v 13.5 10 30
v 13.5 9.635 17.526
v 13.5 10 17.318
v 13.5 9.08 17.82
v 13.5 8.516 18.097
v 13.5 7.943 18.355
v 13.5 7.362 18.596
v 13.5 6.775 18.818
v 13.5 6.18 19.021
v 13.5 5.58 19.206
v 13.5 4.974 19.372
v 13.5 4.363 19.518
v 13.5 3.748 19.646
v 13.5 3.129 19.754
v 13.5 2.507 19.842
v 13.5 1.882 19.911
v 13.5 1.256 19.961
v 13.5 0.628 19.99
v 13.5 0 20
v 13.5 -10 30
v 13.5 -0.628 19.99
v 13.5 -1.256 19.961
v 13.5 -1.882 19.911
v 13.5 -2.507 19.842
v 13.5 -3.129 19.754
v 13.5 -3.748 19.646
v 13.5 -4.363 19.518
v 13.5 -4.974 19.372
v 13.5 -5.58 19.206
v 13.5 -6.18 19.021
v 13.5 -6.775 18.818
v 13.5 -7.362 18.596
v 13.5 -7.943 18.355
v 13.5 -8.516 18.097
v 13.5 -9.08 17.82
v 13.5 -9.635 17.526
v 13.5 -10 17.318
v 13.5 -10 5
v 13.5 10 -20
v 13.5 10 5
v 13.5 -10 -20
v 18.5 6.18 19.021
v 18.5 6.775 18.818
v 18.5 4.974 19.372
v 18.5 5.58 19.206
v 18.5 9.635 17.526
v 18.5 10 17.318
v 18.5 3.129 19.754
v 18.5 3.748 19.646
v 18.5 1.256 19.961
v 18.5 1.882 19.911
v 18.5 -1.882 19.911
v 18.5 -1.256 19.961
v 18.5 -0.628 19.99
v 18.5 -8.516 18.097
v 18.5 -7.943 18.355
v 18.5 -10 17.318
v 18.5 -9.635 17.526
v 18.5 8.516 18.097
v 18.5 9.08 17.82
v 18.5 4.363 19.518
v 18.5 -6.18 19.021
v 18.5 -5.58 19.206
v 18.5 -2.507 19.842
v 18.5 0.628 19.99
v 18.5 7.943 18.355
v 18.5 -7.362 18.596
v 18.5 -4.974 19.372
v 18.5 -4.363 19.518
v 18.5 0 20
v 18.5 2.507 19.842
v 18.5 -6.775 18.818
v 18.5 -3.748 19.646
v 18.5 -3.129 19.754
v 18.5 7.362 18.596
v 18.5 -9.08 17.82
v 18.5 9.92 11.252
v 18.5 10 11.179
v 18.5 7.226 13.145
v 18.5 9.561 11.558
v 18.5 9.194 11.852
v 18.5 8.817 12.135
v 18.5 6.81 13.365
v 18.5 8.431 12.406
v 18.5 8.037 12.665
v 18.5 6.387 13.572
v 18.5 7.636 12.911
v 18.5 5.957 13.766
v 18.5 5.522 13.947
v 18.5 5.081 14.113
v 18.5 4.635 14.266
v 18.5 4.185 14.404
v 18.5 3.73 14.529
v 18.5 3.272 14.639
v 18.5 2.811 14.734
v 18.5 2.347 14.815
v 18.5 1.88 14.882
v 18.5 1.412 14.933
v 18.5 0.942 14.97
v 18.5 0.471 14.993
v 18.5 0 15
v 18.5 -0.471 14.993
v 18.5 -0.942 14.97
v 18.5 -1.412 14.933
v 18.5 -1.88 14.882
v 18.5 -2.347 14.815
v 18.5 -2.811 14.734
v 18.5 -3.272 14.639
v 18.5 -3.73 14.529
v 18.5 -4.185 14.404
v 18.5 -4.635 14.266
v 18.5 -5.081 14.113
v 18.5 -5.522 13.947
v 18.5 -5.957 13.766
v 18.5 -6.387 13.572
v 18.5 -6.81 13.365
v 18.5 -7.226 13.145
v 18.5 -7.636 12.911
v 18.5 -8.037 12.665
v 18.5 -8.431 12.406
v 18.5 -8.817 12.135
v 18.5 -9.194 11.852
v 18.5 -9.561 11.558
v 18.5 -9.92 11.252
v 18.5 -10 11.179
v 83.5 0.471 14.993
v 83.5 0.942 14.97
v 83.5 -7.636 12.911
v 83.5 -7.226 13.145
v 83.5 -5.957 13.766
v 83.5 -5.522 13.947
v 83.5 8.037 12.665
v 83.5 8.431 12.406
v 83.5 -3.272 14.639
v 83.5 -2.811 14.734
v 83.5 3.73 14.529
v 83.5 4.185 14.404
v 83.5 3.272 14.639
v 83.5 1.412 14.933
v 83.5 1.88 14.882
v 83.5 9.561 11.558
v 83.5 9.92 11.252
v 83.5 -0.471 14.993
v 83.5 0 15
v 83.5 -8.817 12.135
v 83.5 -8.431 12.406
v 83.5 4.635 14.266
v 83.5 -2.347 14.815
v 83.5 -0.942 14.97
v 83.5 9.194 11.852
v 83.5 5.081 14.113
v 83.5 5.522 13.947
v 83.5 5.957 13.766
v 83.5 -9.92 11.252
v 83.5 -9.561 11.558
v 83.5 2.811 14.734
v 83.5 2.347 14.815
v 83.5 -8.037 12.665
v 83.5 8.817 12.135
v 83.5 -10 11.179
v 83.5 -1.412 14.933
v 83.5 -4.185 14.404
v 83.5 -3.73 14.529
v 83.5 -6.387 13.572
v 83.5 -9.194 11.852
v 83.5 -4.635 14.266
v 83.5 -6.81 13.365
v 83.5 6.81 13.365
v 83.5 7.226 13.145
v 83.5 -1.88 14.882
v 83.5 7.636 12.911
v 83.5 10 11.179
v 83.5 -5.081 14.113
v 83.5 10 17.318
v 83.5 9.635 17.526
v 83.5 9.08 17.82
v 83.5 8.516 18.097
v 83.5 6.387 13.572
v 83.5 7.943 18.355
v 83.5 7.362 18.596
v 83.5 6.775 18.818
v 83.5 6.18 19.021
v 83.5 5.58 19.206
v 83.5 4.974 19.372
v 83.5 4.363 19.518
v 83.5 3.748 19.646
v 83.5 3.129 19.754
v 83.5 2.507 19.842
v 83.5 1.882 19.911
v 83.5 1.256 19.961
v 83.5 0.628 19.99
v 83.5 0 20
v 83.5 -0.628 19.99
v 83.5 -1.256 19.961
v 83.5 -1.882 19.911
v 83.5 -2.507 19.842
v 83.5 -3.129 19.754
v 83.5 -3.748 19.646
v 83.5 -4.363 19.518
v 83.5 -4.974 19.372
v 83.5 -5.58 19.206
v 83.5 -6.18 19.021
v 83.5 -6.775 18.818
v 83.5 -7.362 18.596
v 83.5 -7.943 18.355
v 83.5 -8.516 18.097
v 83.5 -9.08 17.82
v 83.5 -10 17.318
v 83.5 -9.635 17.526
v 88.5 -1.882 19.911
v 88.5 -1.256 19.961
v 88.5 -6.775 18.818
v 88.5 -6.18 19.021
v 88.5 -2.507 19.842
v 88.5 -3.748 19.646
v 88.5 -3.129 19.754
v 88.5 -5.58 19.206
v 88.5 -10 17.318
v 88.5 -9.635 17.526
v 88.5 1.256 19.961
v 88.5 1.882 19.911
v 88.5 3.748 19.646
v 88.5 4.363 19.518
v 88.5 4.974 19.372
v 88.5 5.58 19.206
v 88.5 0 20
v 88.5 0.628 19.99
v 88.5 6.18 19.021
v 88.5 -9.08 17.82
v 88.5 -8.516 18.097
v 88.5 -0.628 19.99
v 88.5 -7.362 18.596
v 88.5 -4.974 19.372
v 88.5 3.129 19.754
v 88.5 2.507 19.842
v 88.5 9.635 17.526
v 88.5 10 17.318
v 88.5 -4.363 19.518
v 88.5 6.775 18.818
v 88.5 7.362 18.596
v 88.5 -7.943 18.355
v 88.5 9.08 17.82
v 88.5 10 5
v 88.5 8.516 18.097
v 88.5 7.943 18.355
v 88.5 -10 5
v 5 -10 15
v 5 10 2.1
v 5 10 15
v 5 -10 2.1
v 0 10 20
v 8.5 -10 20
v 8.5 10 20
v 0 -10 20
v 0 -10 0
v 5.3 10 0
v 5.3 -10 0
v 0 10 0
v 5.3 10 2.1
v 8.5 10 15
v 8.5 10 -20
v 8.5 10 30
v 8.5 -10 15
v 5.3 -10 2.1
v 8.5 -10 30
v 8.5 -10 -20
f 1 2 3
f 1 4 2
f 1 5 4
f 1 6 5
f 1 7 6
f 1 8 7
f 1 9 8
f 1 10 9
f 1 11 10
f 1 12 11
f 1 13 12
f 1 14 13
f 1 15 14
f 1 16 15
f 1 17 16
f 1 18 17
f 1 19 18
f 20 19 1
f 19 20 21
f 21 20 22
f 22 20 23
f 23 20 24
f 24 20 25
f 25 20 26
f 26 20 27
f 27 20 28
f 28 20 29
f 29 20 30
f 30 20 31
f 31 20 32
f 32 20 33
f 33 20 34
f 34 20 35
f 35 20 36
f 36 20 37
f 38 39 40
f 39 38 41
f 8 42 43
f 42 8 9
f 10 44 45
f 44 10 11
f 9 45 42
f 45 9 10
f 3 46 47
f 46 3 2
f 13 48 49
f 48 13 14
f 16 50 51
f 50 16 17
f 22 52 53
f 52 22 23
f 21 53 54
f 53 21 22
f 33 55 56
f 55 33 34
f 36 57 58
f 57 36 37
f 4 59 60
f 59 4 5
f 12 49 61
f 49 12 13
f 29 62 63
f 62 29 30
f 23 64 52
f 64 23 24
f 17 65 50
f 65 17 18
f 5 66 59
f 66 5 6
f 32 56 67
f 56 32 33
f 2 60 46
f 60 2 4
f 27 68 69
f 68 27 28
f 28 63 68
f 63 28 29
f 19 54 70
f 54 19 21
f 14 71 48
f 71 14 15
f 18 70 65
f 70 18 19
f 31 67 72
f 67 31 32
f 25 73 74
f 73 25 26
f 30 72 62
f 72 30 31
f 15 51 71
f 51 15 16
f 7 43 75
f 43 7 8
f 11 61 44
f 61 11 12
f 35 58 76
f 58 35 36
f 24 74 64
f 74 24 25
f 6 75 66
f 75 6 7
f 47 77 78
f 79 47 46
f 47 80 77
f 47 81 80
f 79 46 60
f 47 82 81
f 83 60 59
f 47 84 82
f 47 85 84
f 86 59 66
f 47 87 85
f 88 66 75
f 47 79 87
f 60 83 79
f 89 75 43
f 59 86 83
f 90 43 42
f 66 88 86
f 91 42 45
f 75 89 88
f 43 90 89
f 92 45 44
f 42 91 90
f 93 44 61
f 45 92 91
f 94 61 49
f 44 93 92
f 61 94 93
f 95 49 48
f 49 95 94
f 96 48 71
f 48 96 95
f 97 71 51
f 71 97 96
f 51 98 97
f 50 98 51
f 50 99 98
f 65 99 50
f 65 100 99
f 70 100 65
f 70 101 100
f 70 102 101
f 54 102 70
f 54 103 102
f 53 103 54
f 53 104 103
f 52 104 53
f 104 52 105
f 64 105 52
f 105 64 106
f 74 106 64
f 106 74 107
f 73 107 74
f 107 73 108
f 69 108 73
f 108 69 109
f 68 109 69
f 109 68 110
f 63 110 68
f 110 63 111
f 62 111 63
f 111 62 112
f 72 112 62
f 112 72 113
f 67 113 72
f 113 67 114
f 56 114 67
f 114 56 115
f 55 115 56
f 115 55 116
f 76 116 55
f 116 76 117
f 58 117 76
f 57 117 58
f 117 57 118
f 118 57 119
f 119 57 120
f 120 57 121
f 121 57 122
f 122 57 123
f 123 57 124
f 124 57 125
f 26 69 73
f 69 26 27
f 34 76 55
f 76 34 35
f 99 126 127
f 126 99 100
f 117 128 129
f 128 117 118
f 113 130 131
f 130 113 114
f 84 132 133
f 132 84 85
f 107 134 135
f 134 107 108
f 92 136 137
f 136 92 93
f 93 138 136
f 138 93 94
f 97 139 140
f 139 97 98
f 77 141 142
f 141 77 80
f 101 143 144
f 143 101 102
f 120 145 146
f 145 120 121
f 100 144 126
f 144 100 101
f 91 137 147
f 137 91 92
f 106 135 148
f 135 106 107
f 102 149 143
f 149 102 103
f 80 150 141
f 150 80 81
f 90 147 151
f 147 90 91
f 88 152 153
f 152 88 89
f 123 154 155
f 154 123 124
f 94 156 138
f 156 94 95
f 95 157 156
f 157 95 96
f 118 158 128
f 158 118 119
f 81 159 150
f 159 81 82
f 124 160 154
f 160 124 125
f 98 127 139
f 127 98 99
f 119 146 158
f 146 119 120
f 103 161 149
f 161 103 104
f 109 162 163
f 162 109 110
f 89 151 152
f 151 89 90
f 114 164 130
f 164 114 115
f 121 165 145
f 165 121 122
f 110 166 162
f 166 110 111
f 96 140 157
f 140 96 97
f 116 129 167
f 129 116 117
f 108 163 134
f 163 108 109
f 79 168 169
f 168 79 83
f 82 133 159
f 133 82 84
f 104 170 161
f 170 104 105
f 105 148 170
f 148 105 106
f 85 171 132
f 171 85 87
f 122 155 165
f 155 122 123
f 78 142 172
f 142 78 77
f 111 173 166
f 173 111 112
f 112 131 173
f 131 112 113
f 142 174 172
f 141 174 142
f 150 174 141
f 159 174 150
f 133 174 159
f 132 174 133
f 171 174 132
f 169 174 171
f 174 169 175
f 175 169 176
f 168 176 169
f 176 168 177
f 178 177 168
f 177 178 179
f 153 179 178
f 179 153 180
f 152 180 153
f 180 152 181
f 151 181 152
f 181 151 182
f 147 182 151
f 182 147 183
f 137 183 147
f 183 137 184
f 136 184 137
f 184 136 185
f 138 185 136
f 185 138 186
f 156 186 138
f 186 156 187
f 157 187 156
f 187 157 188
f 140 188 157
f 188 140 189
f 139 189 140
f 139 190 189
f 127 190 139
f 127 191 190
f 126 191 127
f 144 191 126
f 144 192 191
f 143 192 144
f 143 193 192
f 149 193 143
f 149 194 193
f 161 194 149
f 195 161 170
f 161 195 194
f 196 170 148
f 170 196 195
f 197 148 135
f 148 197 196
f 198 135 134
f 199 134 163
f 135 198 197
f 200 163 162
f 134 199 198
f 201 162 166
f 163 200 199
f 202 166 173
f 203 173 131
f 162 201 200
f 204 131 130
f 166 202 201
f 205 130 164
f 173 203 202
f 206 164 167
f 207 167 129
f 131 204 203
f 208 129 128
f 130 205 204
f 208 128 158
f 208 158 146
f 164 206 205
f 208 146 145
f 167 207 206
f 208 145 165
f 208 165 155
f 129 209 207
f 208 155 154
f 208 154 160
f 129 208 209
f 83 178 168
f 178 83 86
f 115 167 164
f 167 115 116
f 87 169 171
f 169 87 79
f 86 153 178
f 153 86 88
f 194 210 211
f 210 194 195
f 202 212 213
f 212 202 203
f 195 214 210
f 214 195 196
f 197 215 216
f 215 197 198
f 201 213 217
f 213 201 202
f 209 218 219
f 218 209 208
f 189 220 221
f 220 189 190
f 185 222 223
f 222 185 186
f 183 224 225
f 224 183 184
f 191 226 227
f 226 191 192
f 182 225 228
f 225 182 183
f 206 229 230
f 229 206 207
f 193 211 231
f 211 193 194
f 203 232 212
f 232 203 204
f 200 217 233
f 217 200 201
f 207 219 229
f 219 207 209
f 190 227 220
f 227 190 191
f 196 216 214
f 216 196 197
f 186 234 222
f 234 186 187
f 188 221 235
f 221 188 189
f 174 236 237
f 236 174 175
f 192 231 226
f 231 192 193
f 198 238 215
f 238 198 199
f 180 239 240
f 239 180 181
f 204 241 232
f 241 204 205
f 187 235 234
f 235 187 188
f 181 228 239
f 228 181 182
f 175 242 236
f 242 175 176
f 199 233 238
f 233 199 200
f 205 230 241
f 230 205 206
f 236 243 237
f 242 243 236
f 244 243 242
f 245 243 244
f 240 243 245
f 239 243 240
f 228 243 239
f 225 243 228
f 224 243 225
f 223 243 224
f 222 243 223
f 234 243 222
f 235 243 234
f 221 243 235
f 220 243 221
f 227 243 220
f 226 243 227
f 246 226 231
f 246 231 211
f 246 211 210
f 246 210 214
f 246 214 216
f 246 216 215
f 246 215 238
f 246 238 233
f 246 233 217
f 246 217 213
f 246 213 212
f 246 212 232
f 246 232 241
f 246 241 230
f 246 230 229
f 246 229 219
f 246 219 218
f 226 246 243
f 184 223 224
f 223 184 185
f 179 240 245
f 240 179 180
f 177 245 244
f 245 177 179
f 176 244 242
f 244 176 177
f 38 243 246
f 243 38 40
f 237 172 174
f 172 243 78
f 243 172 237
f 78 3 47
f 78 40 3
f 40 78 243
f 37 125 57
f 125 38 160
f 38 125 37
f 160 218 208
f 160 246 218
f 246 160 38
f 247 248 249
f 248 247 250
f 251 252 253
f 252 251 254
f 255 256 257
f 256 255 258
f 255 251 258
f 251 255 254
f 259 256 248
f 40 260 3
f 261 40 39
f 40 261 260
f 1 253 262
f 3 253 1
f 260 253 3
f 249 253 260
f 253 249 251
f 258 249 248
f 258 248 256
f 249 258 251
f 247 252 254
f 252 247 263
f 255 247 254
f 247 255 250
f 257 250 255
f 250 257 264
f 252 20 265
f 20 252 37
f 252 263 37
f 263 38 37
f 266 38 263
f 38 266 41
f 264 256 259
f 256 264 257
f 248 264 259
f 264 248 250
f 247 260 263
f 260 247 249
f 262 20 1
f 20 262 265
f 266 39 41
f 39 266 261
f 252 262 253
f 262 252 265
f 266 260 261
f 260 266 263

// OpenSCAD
$fn=200;
spool_length=65;
sheet_thickness=3.5;
spool_saver=5;
cylinder_dia=30;
bottom_projection=50;
top_projection=15;
inner_projection=20;
offset=5;
tightener=0.3;

translate([0,-cylinder_dia/2+offset,cylinder_dia/2-inner_projection+offset])
    cube([spool_saver,cylinder_dia-offset*2,inner_projection]);

translate([spool_saver,-cylinder_dia/2+offset,cylinder_dia/2-inner_projection+offset])
    cube([tightener,cylinder_dia-offset*2,tightener*sheet_thickness*2]);

translate([0,-cylinder_dia/2+offset,+cylinder_dia/2])
    cube([sheet_thickness+spool_saver*2,cylinder_dia-offset*2,offset]);

translate([sheet_thickness+spool_saver,-cylinder_dia/2+offset,top_projection-bottom_projection+cylinder_dia/2])
    cube([spool_saver,cylinder_dia-offset*2,bottom_projection]);

difference()
{
translate([spool_saver+sheet_thickness+spool_saver,0,0])
rotate([0,90,0])
{
    cylinder(h=spool_saver, r=spool_saver+cylinder_dia/2);
    translate([0,0,spool_saver])
    cylinder(h=spool_length,r=cylinder_dia/2);
    translate([0,0,spool_length+spool_saver])
    cylinder(h=spool_saver, r=spool_saver+cylinder_dia/2);
}

translate([spool_saver+sheet_thickness+spool_saver,-cylinder_dia,-cylinder_dia+offset])
    cube([spool_length+spool_saver*2+offset,cylinder_dia*2, cylinder_dia]);

translate([spool_saver+sheet_thickness+spool_saver-offset/2,cylinder_dia/2-offset,-cylinder_dia])
    cube([spool_length+spool_saver*2+offset,cylinder_dia, cylinder_dia*2]);

translate([spool_saver+sheet_thickness+spool_saver-offset/2,-cylinder_dia-cylinder_dia/2+offset,-cylinder_dia])
    cube([spool_length+spool_saver*2+offset,cylinder_dia, cylinder_dia*2]);
}
